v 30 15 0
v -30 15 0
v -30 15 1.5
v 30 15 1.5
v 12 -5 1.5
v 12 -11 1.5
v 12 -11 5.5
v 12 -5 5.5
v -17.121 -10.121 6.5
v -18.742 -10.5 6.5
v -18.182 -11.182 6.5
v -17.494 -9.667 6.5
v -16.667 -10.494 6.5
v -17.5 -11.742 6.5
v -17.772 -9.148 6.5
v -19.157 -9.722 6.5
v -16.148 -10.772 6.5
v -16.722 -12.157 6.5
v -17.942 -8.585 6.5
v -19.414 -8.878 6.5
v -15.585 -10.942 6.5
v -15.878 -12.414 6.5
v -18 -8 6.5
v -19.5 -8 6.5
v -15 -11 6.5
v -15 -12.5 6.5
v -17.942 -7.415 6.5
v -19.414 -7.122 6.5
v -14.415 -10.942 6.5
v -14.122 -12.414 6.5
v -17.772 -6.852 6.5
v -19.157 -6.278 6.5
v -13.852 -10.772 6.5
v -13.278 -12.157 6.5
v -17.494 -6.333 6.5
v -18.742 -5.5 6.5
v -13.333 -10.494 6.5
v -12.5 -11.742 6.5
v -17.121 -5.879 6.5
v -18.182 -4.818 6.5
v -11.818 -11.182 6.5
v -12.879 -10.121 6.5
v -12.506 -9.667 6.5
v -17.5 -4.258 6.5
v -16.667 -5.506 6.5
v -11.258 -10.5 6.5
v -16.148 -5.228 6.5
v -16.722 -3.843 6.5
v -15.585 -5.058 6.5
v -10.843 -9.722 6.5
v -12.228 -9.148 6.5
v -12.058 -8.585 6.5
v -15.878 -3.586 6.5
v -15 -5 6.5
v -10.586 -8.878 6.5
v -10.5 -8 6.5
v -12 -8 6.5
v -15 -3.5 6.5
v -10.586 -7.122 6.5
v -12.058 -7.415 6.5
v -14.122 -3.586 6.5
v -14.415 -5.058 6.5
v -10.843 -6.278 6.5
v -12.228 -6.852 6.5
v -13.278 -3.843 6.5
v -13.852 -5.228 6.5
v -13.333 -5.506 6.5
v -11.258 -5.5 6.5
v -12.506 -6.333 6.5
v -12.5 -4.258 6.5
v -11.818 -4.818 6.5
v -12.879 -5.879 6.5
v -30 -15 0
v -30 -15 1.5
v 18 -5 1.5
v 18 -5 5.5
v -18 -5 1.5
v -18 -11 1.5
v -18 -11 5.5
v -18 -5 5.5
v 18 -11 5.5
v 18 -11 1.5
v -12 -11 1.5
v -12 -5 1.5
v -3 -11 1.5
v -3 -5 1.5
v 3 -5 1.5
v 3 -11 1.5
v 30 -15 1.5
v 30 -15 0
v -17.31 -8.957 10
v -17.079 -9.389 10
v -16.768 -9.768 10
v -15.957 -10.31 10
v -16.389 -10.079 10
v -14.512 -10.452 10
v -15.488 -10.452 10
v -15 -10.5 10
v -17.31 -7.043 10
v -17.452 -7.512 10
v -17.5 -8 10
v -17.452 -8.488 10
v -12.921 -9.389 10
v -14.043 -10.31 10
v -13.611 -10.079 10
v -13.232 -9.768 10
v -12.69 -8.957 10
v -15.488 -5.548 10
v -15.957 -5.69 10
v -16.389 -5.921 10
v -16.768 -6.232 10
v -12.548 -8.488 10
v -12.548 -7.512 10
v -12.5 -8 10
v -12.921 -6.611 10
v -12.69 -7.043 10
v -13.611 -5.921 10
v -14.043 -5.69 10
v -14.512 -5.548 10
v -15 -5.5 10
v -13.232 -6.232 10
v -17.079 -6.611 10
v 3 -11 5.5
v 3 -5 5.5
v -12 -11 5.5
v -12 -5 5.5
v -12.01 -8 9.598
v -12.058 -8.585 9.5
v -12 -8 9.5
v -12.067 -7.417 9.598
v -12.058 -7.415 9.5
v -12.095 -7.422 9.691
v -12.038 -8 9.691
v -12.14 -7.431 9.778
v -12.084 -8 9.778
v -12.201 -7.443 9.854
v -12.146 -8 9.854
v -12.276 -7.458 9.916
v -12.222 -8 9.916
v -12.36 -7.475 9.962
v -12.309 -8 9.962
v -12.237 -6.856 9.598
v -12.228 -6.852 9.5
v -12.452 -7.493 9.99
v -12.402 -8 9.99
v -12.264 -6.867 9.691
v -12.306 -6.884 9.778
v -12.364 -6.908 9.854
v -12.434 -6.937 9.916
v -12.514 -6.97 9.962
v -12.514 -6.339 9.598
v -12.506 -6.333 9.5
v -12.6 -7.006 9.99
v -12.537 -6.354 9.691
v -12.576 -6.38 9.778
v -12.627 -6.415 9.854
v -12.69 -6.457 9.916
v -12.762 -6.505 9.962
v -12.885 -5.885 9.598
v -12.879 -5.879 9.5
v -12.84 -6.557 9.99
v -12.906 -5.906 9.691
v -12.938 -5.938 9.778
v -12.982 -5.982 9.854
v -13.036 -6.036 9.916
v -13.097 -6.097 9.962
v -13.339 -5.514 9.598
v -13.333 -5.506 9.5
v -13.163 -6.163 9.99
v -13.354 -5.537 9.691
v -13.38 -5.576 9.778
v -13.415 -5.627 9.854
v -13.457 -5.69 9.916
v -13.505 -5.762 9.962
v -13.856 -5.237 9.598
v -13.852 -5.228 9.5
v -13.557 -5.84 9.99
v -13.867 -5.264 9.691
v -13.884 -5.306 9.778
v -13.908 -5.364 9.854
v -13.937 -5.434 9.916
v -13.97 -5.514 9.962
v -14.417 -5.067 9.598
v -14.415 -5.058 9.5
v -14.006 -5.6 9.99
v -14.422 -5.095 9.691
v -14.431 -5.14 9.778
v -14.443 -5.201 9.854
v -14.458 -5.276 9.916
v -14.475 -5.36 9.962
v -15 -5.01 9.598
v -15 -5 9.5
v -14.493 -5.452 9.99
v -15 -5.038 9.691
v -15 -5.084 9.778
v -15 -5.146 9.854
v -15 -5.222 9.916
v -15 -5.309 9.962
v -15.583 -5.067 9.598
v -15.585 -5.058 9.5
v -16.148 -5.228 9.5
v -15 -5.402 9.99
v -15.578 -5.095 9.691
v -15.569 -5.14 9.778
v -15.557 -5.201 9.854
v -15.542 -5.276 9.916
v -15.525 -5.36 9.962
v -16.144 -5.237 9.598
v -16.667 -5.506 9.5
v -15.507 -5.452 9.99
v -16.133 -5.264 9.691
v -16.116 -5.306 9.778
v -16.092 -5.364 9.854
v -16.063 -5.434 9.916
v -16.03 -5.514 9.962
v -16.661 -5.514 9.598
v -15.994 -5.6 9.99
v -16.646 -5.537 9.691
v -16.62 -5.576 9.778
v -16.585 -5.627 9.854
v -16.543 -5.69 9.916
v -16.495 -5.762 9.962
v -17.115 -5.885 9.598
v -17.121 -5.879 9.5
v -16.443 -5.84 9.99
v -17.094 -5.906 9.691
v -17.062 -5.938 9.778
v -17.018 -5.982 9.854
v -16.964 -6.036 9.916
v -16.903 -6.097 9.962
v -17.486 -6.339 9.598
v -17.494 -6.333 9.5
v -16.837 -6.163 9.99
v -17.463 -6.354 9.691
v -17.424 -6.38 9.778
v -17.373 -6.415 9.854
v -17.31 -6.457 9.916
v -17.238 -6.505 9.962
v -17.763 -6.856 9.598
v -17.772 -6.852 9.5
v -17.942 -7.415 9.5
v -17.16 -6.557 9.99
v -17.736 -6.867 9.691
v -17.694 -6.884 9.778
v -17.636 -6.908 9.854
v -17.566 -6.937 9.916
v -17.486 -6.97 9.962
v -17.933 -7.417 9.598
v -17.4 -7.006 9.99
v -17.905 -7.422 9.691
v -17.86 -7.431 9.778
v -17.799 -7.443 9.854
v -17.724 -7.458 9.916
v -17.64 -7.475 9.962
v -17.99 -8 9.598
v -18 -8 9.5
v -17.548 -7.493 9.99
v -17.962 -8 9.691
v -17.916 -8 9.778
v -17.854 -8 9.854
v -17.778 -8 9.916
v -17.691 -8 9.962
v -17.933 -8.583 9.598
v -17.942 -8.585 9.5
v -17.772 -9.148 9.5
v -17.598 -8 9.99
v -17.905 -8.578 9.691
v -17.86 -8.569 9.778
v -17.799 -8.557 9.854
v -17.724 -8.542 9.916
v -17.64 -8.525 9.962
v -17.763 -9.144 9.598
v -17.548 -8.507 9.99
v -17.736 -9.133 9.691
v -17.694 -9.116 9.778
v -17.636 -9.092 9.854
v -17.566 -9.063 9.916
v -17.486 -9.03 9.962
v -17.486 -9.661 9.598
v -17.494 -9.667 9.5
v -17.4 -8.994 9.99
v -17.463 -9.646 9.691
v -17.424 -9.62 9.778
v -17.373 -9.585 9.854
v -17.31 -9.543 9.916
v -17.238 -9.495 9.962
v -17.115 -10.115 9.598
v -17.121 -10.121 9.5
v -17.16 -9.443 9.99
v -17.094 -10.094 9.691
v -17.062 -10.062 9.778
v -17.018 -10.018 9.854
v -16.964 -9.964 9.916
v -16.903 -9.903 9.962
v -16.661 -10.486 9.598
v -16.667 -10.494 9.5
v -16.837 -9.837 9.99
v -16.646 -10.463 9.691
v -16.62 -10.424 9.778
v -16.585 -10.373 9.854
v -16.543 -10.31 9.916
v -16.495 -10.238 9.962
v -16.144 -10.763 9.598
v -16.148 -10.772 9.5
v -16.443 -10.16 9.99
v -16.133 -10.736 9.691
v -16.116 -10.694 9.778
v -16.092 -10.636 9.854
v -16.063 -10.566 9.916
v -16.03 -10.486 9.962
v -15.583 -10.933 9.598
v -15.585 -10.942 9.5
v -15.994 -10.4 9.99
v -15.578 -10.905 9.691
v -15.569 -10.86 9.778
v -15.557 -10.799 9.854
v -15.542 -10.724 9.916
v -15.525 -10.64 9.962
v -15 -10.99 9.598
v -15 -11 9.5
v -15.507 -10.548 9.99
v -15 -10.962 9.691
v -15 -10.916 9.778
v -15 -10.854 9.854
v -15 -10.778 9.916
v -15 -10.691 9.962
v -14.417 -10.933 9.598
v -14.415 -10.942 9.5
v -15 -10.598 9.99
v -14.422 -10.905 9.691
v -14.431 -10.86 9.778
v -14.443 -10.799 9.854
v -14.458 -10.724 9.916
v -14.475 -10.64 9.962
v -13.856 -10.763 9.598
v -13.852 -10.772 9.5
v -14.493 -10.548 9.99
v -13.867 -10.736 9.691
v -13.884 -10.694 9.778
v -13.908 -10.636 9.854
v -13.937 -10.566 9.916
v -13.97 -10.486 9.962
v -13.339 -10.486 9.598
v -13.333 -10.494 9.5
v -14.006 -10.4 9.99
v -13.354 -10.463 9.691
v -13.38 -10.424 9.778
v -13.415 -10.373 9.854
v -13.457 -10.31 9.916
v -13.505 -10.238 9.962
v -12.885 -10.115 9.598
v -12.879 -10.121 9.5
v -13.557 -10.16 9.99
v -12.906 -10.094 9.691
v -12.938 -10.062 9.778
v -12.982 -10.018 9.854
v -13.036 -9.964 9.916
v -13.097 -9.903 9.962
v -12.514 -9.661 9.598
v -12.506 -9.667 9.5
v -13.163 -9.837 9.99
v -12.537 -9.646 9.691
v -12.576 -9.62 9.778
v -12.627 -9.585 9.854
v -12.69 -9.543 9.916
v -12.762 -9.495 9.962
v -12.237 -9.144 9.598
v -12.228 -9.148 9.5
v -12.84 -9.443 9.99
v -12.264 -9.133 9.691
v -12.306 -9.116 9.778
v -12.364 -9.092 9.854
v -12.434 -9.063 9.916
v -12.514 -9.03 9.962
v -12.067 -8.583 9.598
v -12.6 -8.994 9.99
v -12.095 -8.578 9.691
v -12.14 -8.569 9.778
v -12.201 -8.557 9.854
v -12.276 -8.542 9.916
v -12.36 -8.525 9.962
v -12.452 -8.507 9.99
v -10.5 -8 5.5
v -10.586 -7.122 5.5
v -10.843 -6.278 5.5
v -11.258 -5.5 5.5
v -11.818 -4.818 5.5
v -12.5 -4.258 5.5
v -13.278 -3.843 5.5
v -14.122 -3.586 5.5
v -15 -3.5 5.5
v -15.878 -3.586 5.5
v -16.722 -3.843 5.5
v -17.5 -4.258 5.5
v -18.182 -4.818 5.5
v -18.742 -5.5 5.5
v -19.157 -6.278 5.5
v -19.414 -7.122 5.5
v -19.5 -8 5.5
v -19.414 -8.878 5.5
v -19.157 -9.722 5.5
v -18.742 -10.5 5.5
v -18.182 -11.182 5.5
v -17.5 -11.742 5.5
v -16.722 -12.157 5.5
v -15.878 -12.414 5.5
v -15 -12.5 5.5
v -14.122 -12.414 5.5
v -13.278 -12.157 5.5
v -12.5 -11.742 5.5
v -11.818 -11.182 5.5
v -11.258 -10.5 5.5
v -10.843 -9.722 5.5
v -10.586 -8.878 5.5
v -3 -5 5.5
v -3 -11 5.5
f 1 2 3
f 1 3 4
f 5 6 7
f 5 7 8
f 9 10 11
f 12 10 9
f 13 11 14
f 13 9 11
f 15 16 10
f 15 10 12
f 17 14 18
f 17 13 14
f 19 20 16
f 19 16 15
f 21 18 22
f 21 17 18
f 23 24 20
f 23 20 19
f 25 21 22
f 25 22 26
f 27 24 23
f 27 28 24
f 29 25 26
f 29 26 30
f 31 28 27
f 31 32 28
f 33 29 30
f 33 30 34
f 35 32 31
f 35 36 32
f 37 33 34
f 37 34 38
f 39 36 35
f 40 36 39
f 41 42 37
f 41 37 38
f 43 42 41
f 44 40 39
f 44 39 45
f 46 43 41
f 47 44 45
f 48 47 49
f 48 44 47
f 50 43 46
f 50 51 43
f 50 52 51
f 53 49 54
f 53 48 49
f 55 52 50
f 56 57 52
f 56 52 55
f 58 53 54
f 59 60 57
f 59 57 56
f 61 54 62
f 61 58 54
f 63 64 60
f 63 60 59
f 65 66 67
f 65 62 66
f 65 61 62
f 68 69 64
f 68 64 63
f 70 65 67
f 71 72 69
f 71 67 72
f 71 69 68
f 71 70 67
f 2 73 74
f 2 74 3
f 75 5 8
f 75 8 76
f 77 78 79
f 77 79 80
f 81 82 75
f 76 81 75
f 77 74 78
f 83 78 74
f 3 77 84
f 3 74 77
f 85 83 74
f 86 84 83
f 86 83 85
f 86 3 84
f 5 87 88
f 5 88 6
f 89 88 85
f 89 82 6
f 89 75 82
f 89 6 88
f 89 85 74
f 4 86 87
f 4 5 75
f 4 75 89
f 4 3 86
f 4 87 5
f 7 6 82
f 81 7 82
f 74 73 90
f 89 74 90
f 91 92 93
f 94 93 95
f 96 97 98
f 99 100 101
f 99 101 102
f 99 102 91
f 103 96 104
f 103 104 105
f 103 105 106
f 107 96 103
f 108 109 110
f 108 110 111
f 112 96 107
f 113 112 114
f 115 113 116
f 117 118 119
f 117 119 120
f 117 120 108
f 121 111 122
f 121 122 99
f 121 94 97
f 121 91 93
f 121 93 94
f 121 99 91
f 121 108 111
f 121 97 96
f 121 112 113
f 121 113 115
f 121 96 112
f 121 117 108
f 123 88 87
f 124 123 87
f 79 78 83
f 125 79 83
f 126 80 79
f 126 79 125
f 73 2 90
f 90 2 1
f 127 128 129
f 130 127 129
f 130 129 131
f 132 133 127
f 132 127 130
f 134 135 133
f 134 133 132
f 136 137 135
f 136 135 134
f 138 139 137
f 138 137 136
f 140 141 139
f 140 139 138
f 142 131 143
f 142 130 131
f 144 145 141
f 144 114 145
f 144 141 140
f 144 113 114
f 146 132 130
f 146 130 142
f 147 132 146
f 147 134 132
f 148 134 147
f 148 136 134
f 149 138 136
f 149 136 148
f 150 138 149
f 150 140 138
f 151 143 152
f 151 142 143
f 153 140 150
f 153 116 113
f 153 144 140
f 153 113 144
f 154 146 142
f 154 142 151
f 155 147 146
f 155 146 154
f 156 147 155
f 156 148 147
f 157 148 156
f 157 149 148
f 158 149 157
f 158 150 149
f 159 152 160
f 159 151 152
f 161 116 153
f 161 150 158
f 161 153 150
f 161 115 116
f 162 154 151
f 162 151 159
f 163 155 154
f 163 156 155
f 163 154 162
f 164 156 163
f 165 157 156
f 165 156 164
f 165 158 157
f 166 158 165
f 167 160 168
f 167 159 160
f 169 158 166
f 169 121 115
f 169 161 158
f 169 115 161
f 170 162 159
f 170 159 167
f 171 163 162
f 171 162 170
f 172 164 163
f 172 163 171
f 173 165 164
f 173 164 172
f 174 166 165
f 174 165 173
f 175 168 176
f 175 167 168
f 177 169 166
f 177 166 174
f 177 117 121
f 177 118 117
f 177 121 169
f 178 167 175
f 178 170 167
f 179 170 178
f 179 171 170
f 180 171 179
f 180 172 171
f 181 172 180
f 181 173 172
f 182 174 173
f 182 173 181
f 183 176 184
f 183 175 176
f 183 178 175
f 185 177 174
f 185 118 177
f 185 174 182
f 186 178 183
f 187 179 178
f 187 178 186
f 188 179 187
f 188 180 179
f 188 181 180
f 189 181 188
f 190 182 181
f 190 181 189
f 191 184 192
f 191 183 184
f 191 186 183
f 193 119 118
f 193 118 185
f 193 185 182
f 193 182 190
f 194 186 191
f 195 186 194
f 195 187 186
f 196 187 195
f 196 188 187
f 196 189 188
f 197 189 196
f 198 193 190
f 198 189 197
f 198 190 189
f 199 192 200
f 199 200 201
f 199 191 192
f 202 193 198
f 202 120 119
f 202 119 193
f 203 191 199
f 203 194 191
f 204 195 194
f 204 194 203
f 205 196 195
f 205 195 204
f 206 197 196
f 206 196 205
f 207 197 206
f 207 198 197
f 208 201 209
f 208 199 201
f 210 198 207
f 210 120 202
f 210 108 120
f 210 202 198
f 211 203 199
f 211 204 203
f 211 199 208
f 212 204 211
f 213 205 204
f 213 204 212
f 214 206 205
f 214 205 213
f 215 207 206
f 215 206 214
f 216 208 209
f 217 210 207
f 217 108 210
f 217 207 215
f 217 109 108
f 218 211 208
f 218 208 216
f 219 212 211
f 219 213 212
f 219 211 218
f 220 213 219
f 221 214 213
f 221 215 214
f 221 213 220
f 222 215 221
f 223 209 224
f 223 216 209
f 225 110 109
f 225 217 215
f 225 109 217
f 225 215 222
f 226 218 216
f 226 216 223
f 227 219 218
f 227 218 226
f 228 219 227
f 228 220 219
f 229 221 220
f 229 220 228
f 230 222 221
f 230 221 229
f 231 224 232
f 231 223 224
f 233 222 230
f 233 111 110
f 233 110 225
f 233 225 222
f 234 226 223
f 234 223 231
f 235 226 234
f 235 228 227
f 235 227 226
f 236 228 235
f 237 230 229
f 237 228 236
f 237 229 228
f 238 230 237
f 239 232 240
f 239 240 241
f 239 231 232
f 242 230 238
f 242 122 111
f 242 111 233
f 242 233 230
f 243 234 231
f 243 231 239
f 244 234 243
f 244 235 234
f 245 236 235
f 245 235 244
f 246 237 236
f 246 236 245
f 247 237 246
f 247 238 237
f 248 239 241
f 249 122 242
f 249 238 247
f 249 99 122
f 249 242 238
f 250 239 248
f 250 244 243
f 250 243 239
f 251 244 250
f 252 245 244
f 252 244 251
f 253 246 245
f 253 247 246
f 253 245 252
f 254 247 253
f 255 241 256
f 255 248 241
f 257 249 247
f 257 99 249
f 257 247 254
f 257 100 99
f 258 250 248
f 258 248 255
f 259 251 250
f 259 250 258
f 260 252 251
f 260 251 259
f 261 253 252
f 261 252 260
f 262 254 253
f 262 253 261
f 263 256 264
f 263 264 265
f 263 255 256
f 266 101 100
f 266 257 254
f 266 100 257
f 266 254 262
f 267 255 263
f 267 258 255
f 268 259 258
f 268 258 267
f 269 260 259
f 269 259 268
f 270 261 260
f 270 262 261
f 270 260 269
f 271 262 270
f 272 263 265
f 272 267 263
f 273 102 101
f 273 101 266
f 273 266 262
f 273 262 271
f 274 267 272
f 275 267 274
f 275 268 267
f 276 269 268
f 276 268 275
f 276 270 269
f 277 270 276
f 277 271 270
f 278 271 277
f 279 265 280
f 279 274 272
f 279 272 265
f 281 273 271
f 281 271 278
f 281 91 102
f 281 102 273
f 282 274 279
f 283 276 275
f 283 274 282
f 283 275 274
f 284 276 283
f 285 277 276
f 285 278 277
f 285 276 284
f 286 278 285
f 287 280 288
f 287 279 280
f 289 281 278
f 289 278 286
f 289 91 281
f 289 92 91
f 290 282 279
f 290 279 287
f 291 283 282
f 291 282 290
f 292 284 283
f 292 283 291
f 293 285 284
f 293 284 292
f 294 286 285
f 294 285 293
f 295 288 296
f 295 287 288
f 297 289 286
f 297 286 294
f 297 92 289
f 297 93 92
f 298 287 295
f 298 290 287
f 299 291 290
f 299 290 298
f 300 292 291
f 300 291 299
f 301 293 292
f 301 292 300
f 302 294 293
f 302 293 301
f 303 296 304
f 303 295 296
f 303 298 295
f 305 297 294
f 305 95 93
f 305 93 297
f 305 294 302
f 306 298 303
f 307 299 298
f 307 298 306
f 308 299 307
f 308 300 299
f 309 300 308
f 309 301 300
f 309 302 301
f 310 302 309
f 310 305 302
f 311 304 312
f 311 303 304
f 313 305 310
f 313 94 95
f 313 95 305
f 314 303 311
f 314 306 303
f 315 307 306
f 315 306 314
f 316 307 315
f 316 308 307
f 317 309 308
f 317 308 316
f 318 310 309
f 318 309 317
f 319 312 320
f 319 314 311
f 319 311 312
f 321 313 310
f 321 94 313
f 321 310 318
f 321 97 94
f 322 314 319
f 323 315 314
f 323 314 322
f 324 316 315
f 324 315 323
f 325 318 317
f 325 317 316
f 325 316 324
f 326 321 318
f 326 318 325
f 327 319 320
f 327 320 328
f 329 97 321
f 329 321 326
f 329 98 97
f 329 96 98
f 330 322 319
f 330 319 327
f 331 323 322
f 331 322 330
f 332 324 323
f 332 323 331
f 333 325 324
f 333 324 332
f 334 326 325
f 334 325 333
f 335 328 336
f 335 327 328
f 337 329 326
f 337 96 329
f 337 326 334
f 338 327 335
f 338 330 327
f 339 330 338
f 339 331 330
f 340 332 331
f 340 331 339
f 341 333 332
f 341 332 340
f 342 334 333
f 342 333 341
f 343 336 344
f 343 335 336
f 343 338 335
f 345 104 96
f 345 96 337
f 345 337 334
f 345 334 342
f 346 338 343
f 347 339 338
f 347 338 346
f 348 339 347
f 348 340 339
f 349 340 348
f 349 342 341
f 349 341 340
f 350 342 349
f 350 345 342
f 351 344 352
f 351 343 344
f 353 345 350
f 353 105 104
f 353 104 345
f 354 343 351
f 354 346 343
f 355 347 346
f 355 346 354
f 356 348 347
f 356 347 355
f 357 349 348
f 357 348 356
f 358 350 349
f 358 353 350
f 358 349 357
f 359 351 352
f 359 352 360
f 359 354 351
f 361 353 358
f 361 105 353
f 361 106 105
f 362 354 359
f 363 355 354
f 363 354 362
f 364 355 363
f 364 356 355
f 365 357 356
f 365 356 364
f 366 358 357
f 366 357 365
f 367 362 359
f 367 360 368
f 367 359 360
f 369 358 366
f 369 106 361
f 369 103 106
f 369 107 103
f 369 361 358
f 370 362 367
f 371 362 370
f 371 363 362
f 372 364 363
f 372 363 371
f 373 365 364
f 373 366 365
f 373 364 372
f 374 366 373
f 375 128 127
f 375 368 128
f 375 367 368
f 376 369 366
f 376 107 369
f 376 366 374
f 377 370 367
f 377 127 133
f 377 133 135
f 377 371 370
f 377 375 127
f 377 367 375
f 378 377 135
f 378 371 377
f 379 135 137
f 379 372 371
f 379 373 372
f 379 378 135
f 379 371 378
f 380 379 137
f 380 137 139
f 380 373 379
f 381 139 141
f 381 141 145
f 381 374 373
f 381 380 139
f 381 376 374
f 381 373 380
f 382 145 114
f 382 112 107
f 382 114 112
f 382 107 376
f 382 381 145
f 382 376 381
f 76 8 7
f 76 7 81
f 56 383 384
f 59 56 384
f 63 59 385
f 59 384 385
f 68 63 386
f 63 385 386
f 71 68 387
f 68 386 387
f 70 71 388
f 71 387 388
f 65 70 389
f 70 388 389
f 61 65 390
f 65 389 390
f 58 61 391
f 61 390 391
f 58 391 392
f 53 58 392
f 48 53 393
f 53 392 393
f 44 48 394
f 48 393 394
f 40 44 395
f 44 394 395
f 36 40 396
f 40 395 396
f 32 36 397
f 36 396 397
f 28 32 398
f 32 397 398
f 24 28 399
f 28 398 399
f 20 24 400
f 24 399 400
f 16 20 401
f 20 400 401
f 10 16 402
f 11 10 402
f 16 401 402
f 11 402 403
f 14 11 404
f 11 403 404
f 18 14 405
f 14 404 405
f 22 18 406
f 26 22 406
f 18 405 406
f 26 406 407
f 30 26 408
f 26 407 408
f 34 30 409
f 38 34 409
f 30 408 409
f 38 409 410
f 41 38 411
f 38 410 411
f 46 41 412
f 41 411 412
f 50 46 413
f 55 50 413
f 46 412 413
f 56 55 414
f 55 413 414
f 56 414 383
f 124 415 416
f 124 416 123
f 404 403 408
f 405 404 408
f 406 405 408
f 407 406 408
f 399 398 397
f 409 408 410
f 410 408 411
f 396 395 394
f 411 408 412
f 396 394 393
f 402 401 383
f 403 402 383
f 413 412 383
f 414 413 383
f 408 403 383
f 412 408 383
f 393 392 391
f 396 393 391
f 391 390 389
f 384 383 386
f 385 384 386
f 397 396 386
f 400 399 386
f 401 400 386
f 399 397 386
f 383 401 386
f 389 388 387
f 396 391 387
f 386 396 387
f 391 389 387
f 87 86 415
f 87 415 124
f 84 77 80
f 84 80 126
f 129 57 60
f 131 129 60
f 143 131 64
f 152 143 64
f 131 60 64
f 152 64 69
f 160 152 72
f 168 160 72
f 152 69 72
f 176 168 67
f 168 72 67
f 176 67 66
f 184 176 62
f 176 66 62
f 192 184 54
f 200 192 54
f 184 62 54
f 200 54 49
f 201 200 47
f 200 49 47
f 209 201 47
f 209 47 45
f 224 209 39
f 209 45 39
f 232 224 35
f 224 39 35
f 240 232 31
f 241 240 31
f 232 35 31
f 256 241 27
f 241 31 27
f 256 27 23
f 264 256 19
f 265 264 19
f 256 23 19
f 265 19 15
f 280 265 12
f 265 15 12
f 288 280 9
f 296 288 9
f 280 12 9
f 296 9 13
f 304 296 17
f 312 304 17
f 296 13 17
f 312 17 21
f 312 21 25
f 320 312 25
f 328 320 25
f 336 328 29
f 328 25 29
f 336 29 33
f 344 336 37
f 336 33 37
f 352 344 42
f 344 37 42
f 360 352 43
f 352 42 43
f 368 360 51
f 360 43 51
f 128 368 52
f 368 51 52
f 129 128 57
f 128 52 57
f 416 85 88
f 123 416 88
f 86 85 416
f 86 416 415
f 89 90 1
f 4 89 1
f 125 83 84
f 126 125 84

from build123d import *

# Parameters (mm, degrees)
F0_W     = 60
F0_H     = 30
F1_DEPTH = 1.5
F2_W     = 6
F2_H     = 6
F3_DEPTH = 4
F4_R     = 4.5
F5_DEPTH = 1
F6_R     = 3
F7_DEPTH = 3.5
F8_R     = 0.5


with BuildPart() as f1:
    # F0 (on Top) → F1 (new body)
    with BuildSketch(Plane.XY):
        Rectangle(F0_W, F0_H)
    extrude(amount=F1_DEPTH)

    # F2 (on face) → F3 (join)
    with BuildSketch(Plane.XY.offset(1.5)):
        with Locations((-15, -8)):
            Rectangle(F2_W, F2_H)
        with Locations((0, -8)):
            Rectangle(F2_W, F2_H)
        with Locations((15, -8)):
            Rectangle(F2_W, F2_H)
    extrude(amount=F3_DEPTH)


with BuildPart() as f5:
    # F4 (on face) → F5 (new body)
    with BuildSketch(Plane.XY.offset(5.5)):
        with Locations((-15, -8)):
            Circle(F4_R)
    extrude(amount=F5_DEPTH)

    # F6 (on face) → F7 (join)
    with BuildSketch(Plane.XY.offset(6.5)):
        with Locations((-15, -8)):
            Circle(F6_R)
    extrude(amount=F7_DEPTH)

    # F8
    f8_edges = [f5.edges().sort_by_distance(p)[0] for p in [
        (-18, -8, 10),
    ]]
    fillet(f8_edges, radius=F8_R)


solid = Compound([f1.part, f5.part])
